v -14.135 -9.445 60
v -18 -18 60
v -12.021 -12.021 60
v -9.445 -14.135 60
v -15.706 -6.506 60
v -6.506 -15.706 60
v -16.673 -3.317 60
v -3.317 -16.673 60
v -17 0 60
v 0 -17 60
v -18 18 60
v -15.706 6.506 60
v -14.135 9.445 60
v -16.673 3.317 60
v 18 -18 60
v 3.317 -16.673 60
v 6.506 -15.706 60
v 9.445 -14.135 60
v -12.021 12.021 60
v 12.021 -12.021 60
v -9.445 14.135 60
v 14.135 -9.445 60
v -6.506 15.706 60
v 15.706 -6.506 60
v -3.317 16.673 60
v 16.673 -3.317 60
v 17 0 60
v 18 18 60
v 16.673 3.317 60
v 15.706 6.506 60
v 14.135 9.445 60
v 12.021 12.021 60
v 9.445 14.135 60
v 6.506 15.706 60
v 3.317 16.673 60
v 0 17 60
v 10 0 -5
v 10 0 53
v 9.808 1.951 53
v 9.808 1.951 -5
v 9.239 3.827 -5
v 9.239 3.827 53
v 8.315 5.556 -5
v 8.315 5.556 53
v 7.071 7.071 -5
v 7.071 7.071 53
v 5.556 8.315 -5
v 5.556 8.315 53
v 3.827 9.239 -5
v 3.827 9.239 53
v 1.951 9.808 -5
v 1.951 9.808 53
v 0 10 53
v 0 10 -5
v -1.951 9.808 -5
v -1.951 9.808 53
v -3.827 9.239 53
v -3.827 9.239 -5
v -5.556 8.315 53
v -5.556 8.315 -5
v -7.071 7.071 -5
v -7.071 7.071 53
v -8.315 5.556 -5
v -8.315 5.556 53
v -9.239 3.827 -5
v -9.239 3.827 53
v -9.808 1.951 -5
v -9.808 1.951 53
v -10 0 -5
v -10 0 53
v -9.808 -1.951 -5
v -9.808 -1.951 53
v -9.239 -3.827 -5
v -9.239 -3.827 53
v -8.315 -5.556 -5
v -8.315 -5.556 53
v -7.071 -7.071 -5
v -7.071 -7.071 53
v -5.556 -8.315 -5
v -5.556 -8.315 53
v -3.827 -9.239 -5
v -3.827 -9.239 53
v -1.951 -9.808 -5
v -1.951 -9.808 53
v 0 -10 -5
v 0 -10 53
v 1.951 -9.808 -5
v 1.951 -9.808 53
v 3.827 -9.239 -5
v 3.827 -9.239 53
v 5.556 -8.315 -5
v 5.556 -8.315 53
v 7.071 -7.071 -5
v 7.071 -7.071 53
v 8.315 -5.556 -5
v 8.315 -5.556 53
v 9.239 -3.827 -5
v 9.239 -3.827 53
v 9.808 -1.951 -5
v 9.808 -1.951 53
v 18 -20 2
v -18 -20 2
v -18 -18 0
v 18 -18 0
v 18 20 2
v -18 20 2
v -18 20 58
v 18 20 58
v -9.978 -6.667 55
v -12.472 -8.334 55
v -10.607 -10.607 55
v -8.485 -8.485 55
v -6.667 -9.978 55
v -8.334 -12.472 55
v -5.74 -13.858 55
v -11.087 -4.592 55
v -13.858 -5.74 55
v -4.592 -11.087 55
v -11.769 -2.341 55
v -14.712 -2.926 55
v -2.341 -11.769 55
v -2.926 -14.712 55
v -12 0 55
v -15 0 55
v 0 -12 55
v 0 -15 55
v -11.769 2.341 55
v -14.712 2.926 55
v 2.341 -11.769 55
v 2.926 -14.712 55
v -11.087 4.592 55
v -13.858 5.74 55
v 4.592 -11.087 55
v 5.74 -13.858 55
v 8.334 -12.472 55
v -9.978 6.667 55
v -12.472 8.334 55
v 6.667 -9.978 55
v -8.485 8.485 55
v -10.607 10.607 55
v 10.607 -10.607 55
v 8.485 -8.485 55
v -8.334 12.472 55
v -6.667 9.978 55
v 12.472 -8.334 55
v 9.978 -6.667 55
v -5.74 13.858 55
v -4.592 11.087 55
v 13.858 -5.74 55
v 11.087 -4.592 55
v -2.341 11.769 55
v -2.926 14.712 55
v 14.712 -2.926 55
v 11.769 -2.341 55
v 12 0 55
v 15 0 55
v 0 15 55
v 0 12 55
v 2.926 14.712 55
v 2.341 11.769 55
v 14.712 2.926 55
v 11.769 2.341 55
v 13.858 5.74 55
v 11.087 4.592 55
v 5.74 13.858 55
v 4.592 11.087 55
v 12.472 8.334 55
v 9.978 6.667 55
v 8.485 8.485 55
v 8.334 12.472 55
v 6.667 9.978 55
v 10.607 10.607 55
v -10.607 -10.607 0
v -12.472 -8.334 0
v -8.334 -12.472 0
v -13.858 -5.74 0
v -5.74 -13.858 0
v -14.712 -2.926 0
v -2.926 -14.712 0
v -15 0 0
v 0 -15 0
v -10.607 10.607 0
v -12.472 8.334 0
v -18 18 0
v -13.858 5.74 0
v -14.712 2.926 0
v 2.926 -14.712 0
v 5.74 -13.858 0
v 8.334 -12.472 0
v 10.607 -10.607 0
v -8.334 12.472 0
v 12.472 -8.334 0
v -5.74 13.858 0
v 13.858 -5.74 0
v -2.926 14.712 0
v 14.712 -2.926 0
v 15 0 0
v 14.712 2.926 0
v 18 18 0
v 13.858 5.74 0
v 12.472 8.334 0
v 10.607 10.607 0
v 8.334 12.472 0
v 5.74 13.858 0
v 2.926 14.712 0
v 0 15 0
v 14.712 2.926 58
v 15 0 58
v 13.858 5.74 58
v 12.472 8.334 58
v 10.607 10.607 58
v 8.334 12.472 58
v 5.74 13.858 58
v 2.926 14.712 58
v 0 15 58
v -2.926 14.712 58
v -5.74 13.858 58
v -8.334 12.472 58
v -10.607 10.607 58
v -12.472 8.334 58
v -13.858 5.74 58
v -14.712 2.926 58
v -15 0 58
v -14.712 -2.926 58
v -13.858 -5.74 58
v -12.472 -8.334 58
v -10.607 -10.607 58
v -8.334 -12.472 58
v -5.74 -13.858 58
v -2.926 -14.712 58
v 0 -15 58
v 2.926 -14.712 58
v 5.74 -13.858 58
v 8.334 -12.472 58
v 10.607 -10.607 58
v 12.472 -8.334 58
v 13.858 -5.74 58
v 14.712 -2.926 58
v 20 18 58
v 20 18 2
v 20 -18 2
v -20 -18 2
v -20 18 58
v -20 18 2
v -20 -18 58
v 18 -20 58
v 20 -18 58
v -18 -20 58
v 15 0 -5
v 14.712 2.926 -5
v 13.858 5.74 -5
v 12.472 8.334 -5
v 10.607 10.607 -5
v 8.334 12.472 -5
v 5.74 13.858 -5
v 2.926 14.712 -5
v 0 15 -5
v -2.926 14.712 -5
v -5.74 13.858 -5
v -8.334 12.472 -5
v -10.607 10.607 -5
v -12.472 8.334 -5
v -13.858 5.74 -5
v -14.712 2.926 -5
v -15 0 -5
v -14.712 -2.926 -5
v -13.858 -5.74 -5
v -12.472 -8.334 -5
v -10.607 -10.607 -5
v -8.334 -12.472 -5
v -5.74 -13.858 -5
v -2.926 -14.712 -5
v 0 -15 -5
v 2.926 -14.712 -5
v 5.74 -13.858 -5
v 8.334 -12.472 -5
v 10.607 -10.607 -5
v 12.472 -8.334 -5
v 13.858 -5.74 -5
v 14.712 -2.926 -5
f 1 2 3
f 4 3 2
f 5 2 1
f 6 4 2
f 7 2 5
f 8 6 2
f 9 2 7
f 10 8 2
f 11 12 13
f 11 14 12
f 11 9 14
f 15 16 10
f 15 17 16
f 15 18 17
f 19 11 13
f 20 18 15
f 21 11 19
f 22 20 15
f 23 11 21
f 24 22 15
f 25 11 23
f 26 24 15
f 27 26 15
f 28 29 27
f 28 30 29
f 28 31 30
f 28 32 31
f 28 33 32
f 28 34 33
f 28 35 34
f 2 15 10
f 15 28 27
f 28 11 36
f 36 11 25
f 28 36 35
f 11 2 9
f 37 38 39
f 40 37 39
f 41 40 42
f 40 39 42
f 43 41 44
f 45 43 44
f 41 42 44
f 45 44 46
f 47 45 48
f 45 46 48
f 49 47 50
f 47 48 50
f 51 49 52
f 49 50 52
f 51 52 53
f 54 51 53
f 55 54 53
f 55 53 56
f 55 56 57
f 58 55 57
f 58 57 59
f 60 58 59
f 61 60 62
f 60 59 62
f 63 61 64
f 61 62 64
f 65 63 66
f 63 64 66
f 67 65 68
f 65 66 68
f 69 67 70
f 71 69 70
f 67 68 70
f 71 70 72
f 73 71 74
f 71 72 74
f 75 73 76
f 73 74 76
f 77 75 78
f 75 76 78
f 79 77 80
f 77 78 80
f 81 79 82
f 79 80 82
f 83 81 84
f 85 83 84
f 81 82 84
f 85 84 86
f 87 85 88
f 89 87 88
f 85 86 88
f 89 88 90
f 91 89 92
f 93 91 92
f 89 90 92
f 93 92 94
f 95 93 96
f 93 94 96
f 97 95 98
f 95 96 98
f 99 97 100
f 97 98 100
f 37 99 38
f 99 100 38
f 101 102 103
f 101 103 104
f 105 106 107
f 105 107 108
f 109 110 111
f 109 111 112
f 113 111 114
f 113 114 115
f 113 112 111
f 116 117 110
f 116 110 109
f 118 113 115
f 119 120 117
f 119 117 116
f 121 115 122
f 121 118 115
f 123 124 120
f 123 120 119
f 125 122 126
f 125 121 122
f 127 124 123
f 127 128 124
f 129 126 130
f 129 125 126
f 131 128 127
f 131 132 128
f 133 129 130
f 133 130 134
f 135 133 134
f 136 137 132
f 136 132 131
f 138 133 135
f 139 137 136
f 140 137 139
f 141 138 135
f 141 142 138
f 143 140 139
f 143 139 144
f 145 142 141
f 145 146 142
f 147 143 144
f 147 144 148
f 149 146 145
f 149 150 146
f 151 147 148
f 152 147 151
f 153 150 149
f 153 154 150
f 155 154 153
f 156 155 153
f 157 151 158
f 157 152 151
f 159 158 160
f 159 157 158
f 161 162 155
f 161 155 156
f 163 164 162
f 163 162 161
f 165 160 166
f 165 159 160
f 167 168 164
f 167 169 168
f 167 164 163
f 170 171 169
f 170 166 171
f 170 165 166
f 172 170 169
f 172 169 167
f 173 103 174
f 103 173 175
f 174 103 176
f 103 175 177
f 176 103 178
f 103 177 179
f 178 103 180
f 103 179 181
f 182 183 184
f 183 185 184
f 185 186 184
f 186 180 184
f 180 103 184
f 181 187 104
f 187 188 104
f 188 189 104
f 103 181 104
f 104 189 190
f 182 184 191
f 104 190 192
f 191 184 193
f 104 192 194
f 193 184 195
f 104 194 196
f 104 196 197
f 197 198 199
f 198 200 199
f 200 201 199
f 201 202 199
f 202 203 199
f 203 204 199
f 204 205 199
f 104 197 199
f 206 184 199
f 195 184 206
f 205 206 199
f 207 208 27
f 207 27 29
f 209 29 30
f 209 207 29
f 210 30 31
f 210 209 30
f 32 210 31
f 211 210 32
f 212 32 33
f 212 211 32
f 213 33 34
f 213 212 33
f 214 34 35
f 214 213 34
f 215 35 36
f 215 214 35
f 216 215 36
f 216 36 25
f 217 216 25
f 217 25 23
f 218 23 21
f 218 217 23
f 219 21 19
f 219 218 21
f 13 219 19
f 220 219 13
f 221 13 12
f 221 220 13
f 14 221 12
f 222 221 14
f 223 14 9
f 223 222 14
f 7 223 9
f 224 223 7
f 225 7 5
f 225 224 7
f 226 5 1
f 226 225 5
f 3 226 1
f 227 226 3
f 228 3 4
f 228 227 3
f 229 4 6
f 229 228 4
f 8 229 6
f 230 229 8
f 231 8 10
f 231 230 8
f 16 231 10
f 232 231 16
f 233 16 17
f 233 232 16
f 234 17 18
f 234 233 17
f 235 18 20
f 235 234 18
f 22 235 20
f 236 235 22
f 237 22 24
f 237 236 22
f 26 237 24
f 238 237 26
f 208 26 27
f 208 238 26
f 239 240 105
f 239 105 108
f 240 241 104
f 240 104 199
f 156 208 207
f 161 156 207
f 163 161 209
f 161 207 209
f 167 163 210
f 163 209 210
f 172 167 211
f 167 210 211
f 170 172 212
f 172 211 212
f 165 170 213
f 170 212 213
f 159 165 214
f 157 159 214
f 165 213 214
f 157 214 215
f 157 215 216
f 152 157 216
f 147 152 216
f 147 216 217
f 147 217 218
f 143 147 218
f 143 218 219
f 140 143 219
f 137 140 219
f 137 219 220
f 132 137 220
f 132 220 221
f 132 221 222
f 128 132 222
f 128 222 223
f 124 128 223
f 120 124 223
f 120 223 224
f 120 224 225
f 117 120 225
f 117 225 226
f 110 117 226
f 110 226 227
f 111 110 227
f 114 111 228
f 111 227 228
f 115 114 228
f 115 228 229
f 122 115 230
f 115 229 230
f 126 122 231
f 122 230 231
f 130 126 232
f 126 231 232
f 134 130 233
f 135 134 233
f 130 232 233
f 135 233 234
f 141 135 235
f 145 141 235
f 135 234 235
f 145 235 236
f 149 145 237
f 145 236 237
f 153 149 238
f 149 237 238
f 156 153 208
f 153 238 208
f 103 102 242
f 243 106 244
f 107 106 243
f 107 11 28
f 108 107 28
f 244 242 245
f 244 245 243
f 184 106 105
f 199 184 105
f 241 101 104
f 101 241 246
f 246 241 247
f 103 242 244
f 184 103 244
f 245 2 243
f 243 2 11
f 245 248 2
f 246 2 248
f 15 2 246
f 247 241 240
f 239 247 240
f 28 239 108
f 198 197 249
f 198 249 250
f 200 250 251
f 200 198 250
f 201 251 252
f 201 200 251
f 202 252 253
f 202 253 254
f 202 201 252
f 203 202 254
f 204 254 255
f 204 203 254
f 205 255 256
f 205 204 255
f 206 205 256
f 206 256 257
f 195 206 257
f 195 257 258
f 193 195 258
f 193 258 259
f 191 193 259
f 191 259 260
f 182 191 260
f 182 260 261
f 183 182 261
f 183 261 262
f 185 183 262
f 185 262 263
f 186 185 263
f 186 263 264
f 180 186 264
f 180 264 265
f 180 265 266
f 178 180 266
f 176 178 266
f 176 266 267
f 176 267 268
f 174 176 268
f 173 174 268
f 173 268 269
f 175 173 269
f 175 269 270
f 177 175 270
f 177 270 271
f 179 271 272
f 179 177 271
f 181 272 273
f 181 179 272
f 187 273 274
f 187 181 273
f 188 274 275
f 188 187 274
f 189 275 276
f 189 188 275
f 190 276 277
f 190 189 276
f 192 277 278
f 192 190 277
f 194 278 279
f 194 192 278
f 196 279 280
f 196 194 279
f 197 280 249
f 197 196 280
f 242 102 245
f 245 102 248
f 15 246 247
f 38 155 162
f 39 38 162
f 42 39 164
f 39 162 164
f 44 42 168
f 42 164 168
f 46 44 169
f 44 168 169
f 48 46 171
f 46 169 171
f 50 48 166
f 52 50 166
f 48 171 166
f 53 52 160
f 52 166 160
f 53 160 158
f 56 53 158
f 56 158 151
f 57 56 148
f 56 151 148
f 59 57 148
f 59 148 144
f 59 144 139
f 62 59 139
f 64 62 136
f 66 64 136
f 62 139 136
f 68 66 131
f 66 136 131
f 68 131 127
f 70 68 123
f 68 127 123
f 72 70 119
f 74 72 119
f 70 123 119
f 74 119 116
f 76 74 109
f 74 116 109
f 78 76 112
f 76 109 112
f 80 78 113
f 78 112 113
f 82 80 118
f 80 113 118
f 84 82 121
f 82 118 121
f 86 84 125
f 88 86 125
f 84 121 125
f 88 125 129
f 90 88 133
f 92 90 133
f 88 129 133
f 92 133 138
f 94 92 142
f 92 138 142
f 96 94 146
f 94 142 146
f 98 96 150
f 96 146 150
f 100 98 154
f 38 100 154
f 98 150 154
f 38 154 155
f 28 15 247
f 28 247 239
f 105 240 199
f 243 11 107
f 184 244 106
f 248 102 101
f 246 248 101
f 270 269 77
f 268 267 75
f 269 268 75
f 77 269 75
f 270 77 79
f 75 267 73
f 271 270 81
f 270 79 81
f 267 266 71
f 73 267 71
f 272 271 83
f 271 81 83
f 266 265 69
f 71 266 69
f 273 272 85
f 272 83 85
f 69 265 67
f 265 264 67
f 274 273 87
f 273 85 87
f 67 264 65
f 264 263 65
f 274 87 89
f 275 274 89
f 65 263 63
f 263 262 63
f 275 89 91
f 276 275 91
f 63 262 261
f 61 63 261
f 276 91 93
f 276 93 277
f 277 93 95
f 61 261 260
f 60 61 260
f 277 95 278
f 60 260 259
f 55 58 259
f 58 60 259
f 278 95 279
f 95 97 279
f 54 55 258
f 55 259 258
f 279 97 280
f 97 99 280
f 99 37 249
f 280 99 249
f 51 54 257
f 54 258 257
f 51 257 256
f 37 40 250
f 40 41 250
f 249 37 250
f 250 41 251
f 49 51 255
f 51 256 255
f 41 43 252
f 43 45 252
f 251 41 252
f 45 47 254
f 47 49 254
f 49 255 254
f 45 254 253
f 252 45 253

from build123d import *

# Parameters (mm, degrees)
F0_W     = 40
F0_H     = 40
F1_DEPTH = 60
F2_R     = 15
F3_DEPTH = 60
F5_START = -5
F4_R     = 15
F4_R_2   = 10
F5_DEPTH = 60
F6_SIZE  = 2


with BuildPart() as f1:
    # F0 (on Top) → F1 (new body)
    with BuildSketch(Plane.XY):
        Rectangle(F0_W, F0_H)
    extrude(amount=F1_DEPTH)

    # F2 (on face) → F3 (cut, through all)
    with BuildSketch(Plane.XY.offset(60)):
        Circle(F2_R)
    extrude(amount=-F3_DEPTH, mode=Mode.SUBTRACT)

    # F4 (on face) → F5 (join)
    with BuildSketch(Plane.XY.offset(60).offset(F5_START)):
        Circle(F4_R)
        Circle(F4_R_2, mode=Mode.SUBTRACT)
    extrude(amount=-F5_DEPTH)

    # F6
    f6_edges = [f1.edges().sort_by_distance(p)[0] for p in [
        (-20, -20, 30),
        (20, -20, 30),
        (0, -20, 60),
        (0, -20, 0),
        (20, 0, 0),
        (20, 20, 30),
        (20, 0, 60),
        (-20, 0, 60),
        (0, 20, 60),
        (-20, 20, 30),
        (-20, 0, 0),
        (0, 20, 0),
        (-15, 0, 60),
        (-10, 0, 55),
    ]]
    chamfer(f6_edges, length=F6_SIZE)


solid = f1.part
